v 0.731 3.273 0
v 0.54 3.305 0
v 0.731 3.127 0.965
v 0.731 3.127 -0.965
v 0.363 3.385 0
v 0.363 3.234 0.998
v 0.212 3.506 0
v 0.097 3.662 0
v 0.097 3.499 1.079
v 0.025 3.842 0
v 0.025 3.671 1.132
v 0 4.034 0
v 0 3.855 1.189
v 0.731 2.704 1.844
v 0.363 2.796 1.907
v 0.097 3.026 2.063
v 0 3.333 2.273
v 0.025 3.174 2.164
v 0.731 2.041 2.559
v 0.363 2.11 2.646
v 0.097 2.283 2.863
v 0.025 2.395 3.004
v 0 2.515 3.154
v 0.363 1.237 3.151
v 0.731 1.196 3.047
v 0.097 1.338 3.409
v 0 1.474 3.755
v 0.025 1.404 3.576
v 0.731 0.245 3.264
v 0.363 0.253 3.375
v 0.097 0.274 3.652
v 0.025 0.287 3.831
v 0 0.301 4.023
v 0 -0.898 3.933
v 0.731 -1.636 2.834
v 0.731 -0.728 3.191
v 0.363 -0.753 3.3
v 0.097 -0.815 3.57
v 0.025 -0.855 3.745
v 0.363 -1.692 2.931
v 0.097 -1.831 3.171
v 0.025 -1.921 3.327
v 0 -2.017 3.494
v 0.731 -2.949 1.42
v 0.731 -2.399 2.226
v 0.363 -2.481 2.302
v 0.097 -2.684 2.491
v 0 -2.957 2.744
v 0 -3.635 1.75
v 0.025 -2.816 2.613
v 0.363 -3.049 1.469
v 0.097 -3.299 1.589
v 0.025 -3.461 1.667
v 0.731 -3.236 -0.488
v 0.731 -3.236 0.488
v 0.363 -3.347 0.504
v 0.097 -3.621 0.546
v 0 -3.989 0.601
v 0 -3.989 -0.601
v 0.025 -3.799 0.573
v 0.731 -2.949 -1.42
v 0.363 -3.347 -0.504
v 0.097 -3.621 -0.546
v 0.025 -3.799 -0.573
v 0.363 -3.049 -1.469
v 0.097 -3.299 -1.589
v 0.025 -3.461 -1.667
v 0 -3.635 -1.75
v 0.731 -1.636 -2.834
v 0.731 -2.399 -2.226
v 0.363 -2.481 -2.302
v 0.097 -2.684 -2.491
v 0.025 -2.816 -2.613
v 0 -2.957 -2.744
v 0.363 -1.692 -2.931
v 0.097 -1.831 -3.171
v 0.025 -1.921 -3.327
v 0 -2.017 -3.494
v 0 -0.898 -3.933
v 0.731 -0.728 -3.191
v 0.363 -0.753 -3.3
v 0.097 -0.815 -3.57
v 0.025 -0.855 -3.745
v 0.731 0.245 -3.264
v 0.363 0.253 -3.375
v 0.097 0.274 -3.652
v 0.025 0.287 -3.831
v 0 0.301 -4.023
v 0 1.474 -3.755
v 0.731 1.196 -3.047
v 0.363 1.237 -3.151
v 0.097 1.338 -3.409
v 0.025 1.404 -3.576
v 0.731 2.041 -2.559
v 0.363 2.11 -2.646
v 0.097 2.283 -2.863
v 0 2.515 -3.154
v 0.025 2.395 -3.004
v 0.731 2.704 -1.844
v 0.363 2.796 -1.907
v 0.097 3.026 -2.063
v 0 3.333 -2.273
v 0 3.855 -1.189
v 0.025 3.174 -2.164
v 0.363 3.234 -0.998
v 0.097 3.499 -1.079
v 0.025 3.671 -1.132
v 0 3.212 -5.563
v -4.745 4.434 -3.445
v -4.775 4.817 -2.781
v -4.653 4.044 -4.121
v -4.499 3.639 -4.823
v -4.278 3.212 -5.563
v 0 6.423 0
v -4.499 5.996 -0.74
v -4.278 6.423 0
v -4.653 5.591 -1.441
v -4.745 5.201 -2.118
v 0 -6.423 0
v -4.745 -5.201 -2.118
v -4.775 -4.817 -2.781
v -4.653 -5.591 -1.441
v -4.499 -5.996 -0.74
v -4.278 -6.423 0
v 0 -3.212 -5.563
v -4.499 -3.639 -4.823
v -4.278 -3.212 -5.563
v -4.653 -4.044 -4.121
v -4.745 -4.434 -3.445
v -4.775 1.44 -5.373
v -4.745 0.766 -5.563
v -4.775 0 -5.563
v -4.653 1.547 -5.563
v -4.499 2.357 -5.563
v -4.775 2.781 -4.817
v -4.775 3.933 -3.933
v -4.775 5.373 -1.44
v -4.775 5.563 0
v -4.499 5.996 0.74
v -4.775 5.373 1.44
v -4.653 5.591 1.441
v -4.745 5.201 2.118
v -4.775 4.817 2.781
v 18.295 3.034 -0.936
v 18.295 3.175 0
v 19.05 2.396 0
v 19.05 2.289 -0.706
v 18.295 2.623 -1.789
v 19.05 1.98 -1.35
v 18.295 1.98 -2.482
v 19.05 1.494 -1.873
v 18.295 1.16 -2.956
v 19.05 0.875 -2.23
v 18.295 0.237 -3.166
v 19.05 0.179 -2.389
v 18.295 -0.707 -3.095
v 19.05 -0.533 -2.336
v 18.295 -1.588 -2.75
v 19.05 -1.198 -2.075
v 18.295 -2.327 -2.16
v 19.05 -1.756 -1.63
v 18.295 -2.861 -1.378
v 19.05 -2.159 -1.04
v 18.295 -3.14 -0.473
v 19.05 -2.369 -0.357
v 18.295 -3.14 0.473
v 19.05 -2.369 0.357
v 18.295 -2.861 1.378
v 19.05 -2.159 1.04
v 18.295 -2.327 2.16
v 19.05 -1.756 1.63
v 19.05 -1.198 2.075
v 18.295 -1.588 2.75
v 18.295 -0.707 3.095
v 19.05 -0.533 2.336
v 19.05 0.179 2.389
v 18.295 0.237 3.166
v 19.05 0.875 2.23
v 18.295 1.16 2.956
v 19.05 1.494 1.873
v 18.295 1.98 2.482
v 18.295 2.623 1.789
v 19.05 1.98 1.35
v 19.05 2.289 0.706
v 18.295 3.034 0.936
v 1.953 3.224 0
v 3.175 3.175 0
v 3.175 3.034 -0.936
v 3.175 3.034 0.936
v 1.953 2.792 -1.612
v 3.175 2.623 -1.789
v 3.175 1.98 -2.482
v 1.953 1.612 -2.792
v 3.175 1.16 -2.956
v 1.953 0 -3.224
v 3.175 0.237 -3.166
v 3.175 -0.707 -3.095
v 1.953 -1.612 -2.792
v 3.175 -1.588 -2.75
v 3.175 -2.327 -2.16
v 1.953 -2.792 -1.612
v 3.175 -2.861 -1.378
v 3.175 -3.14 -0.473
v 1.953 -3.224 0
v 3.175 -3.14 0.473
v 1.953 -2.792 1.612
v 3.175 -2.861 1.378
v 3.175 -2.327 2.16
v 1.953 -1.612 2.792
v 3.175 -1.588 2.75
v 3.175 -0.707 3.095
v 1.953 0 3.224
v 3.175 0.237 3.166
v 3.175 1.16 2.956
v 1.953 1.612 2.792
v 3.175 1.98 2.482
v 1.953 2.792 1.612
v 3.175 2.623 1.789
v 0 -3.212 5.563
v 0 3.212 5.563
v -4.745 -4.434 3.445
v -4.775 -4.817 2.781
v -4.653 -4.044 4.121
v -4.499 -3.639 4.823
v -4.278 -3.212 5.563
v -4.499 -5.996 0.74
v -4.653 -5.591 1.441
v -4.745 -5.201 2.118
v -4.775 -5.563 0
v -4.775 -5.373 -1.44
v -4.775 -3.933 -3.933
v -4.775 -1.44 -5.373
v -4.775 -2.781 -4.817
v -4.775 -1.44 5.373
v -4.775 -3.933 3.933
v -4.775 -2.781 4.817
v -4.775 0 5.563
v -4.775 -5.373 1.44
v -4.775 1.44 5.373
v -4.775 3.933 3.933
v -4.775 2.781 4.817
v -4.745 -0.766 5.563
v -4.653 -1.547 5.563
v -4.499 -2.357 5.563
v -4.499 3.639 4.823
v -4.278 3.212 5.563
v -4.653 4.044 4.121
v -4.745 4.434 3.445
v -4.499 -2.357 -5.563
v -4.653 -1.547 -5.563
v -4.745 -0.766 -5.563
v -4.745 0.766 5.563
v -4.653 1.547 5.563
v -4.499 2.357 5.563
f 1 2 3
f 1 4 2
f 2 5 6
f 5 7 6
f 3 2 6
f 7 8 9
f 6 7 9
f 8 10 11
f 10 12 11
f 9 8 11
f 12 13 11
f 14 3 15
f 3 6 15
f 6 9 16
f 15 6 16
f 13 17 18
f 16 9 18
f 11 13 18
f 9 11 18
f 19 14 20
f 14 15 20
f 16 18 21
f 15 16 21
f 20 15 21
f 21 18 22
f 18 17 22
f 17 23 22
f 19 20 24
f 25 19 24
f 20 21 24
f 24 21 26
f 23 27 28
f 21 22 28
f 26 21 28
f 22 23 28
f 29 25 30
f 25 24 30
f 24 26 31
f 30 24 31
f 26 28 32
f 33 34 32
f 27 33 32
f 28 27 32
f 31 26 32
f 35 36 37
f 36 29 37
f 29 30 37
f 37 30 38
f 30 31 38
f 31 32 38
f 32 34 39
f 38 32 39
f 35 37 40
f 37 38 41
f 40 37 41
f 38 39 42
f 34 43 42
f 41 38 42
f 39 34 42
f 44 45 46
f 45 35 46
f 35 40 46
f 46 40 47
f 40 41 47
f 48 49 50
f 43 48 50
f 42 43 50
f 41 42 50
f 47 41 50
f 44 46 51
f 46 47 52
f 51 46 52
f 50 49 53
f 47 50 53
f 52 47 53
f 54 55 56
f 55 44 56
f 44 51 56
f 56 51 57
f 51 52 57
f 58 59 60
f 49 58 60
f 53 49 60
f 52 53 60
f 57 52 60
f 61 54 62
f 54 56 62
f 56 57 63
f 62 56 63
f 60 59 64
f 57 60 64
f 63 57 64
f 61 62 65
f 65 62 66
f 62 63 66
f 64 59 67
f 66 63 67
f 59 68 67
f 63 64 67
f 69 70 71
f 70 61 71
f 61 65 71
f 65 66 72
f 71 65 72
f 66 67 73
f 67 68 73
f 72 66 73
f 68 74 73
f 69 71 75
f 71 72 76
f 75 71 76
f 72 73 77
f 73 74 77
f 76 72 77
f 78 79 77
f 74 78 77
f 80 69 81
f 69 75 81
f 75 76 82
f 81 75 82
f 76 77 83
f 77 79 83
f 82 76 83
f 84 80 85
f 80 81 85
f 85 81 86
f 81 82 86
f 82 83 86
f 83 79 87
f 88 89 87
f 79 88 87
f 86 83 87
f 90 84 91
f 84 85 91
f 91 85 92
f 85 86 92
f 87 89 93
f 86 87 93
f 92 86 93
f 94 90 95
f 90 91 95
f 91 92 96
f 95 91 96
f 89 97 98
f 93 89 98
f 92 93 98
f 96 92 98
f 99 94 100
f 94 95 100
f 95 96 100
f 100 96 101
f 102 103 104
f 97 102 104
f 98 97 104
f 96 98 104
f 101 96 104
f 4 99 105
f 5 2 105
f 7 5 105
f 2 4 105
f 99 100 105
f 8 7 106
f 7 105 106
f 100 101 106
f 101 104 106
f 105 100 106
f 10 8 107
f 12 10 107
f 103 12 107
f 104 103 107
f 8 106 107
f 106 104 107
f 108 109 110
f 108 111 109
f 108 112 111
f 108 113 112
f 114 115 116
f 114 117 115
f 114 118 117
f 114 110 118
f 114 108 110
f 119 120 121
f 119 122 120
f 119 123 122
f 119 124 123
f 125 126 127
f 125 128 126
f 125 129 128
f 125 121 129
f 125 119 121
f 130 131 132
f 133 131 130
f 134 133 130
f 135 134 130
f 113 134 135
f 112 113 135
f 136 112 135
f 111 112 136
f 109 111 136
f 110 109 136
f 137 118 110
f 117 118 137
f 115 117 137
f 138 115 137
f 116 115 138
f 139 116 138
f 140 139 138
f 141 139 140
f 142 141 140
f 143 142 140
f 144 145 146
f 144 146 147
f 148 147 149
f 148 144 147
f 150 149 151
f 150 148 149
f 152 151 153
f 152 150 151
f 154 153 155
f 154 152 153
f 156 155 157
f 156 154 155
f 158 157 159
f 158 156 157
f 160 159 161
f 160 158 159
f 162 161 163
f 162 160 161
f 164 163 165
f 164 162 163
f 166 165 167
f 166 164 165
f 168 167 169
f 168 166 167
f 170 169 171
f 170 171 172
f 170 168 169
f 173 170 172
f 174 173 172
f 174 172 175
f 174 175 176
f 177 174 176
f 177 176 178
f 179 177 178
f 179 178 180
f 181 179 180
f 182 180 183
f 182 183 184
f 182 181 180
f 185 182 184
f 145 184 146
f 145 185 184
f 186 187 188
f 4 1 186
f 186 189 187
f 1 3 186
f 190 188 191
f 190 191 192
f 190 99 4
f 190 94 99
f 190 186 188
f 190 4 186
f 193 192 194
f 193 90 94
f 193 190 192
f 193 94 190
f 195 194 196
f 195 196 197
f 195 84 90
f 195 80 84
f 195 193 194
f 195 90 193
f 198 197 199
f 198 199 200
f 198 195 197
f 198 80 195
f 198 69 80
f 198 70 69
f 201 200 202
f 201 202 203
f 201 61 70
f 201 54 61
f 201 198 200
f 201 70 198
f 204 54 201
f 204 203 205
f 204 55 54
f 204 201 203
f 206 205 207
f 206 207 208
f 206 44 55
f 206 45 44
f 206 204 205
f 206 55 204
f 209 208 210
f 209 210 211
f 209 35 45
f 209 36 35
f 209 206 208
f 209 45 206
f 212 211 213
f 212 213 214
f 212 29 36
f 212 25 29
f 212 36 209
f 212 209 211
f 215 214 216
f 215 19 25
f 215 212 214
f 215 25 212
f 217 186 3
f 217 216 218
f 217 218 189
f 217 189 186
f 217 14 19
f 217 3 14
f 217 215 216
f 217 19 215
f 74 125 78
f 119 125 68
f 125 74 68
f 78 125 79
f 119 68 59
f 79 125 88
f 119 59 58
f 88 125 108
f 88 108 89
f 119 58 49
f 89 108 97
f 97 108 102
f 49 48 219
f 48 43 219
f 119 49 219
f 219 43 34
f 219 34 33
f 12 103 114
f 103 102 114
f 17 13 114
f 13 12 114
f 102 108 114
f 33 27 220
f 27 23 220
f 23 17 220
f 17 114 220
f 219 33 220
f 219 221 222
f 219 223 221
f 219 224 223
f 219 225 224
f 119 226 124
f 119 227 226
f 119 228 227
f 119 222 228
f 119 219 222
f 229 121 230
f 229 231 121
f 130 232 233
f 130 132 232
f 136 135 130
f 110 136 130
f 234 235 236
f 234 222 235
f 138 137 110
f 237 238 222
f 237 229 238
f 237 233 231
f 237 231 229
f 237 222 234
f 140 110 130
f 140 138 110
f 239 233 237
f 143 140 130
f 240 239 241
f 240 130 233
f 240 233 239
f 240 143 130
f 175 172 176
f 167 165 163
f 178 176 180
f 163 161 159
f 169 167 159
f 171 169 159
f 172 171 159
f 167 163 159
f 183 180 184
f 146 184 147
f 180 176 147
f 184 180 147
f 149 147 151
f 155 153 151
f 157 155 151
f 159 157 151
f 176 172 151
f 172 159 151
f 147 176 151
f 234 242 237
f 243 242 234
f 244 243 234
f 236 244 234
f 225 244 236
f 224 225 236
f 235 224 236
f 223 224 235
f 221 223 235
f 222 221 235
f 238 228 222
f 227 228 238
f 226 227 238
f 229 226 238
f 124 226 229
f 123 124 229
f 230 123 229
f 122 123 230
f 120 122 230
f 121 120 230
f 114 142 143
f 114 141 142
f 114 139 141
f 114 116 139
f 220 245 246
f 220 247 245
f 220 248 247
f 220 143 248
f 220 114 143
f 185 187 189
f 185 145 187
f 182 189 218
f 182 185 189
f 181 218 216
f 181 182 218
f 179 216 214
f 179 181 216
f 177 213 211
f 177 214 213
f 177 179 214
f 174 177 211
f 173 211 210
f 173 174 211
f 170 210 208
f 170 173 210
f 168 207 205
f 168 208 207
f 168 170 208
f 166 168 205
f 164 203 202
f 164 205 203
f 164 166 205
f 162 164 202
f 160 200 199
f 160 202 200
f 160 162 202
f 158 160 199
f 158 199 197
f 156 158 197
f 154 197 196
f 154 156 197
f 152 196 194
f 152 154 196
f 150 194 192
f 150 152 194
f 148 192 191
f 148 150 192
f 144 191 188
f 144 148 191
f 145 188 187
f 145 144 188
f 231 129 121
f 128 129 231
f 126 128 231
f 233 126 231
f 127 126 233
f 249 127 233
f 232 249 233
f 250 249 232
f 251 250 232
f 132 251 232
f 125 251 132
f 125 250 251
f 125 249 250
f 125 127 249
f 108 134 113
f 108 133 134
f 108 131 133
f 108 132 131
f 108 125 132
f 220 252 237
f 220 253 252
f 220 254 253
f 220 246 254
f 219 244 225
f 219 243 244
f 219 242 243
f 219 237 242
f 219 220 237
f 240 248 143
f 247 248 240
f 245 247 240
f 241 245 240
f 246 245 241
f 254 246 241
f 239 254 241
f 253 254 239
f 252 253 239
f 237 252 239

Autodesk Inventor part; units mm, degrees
ref_plane "YZ Plane" through (0, 0, 0) normal (1, 0, 0) x (0, 1, 0)
ref_plane "XZ Plane" through (0, 0, 0) normal (0, 1, 0) x (-1, 0, 0)
sketch "Sketch1" plane through (0, 0, 0) normal (0, 0, 1) x (1, 0, 0)
  line L0 (0, 5.5626) -> (0, 3.302)
  line L1 (3.175, 3.175) -> (19.05, 3.175)
  line L2 (19.05, 3.175) -> (19.05, 0)
  line L3 (19.05, 0) -> (-0.0001, 0)
  line L4 (-3.8101, 0) -> (22.86, 0) projected
  line L5 (-0.0001, 0) -> (-0.0001, 5.5626)
  line L6 (-0.0001, 5.5626) -> (0, 5.5626)
  line L7 (3.175, 3.175) -> (0.0019, 3.302)
  line L8 (0.0019, 3.302) -> (0, 3.302)
  line L9 (0, -1.1125) -> (0, 6.6751) projected
  dimension "d0" = 19.05
  dimension "d1" = 15.875
  dimension "d2" = 6.35
  dimension "d9" = 0.0001
  dimension "d10" = 11.1252
  dimension "d13" = 3.1731
  dimension "d14" = 6.604
revolve "Body" add sketch "Sketch1" angle 360 about axis through (19.05, 0, 0) along (-1, 0, 0)
sketch "Sketch2" plane through (-0.0001, 0, 0) normal (-1, 0, 0) x (0, 0, 1)
  line L0 (0, 6.4231) -> (5.5626, 3.2116)
  line L1 (5.5626, 3.2116) -> (5.5626, -3.2116)
  line L2 (5.5626, -3.2116) -> (0, -6.4231)
  line L3 (0, -6.4231) -> (-5.5626, -3.2116)
  line L4 (-5.5626, -3.2116) -> (-5.5626, 3.2116)
  line L5 (-5.5626, 3.2116) -> (0, 6.4231)
  point P0 (0, 0)
  point P1 (0, 0)
  dimension "d11" = 11.1252
extrude "Head" add sketch "Sketch2" along normal blind 4.7752
sketch "Sketch4" plane through (0, 0, 0) normal (0, 0, 1) x (1, 0, 0)
  line L0 (-4.7753, 5.5626) -> (-4.7753, 6.4231)
  line L1 (-4.7753, 6.4231) -> (-4.2785, 6.4231)
  line L2 (-4.2785, 6.4231) -> (-4.7753, 5.5626)
  line L3 (-5.7303, 0) -> (0.9549, 0) projected
  line L4 (-0.0001, 6.4231) -> (-4.7753, 6.4231) projected
  line L5 (-4.7753, 3.2116) -> (-4.7753, 6.4231) projected
  dimension "d5" = 30
  dimension "d19" = 11.1252
revolve "Chamfer1" cut sketch "Sketch4" angle 360 about axis through (-10, 0, 0) along (1, 0, 0)
thread "Thread" size "1/4-20 UNC" class "2A" standard "ANSI Unified Screw Threads" length 15.875
chamfer "Chamfer2" distance 0.7791 distance2 0.7553 1 edges at (19.05, -3.175, 0) measured on face at (19.05, -0.5663, 0.5832)
ref_plane "Work Plane1" through (1.525, 0, 0) normal (0, 0, 1) x (1, 0, 0)
fillet "Fillet2" radius 0.762 1 edges at (0.0019, -3.302, 0)
equation "\"d0\" = NLG"
equation "\"d1\" = GEL"
equation "\"d2\" = GD"
equation "\"d10\" = SD2"
equation "\"d14\" = BDM"
equation "\"d11\" = SW"
equation "\"d3\" = KOH - SD"
equation "\"d5\" = ANG1"
equation "\"d19\" = SW0"
equation "\"d63\" = R"
equation "\"d15\" = GEL"
equation "\"d6\" = -0.5 * SPD + 0.5 * GD"
equation "\"NLG\" = 19.05"
equation "\"GD\" = NND"
equation "\"BDM\" = 6.604"
equation "\"KOH\" = 4.7752"
equation "\"GEL\" = 15.875"
equation "\"SW\" = 11.1252"
equation "\"SW0\" = SW"
equation "\"SPD\" = GD1"
equation "\"SD2\" = SW"
equation "\"SD\" = 0"
equation "\"ANG1\" = 30deg"
equation "\"GAL\" = 3.173"
equation "\"GUL\" = 0.238 * GAL"
equation "\"R\" = 0.762"
equation "\"d62\" = -NLG - SD + GUL"
equation "\"GD1\" = 4.79184"
equation "\"THREADDIA\" = 6.35"
equation "\"TOA\" = 30deg"
equation "\"NND\" = 6.35"
equation "\"E0\" = 1.155 * SW"
properties part number "ANSI/ASME B18.2.1 - 1/4-20 UNC - 0.75" material "Steel, Mild"
